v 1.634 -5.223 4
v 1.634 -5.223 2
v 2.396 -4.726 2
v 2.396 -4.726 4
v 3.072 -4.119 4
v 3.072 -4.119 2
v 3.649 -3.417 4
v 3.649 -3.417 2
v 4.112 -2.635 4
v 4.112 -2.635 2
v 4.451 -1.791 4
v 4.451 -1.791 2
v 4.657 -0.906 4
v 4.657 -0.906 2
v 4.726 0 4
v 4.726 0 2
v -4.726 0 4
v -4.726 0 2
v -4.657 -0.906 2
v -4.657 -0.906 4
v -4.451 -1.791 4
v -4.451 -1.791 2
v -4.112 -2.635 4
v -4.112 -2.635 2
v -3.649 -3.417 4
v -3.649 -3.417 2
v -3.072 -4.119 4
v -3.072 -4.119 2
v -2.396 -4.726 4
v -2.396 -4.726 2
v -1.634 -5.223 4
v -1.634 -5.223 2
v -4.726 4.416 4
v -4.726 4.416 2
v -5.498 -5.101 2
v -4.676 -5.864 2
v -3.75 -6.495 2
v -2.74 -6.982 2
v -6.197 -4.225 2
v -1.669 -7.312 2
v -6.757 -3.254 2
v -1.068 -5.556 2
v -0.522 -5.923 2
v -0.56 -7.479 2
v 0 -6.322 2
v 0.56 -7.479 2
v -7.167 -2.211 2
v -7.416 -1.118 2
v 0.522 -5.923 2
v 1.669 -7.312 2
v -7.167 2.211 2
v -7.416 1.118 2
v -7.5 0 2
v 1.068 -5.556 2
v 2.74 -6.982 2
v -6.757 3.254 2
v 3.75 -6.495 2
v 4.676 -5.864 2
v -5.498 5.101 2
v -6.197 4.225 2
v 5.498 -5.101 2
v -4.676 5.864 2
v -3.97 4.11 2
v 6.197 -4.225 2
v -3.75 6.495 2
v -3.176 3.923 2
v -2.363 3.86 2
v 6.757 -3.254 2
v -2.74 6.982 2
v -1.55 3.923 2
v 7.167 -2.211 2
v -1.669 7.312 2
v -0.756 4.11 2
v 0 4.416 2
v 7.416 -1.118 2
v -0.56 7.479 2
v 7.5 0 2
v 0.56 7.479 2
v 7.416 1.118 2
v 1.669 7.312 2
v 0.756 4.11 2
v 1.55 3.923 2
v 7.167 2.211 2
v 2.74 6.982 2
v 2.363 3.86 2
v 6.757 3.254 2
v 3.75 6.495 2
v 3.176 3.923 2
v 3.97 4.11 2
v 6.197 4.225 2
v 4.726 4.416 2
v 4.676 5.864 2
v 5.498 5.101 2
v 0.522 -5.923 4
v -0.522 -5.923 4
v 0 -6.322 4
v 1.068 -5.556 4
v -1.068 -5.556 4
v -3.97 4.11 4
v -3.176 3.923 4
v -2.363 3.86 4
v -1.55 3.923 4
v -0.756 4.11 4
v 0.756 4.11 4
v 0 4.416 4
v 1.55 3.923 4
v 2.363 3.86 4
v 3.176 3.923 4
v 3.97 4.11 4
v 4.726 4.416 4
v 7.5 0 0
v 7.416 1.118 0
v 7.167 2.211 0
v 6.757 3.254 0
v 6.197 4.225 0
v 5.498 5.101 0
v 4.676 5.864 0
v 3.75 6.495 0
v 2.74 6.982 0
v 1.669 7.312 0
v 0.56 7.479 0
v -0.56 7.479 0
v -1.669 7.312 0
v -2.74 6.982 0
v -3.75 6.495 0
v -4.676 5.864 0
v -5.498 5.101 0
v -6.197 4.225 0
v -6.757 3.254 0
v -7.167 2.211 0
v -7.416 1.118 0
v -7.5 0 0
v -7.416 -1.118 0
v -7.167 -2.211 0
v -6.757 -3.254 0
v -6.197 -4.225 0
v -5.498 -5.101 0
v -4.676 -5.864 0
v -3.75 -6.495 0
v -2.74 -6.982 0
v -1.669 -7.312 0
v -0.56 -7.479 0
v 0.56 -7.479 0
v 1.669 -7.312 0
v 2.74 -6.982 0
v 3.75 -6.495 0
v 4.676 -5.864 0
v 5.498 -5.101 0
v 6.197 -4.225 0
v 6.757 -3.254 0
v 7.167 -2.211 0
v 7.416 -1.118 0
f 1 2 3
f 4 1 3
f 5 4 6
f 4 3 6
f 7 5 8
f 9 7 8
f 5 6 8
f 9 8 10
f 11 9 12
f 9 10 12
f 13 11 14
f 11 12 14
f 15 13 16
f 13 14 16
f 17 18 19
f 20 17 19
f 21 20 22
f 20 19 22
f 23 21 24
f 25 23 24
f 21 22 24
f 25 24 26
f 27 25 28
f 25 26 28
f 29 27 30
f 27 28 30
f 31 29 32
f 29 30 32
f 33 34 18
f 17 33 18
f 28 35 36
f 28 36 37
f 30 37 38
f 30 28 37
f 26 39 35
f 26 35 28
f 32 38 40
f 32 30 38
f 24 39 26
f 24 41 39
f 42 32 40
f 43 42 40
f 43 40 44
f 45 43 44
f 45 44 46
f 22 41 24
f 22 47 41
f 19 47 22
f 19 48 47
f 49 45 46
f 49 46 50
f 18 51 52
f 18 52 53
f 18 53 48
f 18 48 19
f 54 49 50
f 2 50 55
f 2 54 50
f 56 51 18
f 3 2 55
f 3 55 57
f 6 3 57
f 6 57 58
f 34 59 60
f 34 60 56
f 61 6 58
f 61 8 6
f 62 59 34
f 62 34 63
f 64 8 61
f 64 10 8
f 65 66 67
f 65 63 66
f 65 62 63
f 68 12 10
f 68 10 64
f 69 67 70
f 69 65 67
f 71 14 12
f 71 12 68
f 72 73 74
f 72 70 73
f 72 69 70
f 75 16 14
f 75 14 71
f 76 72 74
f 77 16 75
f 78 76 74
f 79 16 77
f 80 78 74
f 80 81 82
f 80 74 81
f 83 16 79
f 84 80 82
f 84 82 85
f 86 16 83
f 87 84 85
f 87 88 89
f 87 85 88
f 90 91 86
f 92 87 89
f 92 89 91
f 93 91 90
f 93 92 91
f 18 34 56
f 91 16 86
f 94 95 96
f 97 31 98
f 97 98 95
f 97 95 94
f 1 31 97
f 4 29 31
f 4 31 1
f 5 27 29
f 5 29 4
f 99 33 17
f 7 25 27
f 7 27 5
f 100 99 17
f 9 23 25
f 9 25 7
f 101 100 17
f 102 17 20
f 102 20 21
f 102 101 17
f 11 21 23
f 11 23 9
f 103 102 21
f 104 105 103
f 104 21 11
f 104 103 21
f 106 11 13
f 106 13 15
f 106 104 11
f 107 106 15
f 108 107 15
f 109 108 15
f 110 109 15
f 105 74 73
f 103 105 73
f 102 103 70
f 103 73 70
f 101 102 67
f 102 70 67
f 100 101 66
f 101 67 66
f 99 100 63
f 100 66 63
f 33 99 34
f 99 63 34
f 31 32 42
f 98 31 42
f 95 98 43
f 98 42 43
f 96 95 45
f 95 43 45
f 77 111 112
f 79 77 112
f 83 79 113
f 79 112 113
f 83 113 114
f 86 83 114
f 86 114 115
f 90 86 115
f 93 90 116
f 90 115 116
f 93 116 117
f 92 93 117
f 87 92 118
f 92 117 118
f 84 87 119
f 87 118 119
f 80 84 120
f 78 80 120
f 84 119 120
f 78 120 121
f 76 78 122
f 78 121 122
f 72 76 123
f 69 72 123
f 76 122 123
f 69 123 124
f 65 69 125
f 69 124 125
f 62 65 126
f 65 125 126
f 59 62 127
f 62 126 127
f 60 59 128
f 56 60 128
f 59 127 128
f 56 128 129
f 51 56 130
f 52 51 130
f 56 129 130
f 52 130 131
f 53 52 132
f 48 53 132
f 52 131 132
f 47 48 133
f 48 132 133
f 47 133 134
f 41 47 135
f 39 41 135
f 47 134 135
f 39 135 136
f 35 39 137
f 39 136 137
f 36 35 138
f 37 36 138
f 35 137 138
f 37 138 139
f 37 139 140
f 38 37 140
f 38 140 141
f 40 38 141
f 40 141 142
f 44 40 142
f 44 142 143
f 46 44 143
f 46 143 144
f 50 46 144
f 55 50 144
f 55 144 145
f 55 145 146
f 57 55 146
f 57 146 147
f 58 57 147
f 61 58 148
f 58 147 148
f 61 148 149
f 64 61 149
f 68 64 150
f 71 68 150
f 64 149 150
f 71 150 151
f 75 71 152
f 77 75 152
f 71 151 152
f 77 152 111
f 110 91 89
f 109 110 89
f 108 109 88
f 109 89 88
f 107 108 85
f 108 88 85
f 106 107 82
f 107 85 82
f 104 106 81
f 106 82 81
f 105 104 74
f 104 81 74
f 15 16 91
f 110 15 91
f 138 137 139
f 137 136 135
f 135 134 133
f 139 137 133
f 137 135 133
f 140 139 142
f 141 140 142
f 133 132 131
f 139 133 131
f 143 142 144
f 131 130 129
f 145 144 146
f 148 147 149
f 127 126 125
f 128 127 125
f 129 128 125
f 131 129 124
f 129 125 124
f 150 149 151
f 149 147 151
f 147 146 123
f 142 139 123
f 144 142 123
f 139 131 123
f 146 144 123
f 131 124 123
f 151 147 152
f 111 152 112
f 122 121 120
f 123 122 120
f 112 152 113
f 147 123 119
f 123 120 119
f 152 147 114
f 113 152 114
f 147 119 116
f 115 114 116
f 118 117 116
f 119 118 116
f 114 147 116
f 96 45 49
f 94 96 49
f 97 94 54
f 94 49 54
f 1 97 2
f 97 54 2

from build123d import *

# Parameters (mm, degrees)
F0_R     = 7.5
F1_DEPTH = 2
F3_DEPTH = 2


with BuildPart() as f1:
    # F0 (on Top) → F1 (new body)
    with BuildSketch(Plane.XY):
        Circle(F0_R)
    extrude(amount=F1_DEPTH)

    # F2 (on face) → F3 (join)
    with BuildSketch(Plane.XY.offset(2)):
        with BuildLine():
            ThreePointArc((-1.634316, -5.22253), (-0.792326, -5.735097), (0, -6.321519))
            ThreePointArc((0, -6.321519), (0.792326, -5.735097), (1.634316, -5.22253))
            ThreePointArc((1.634316, -5.22253), (3.895395, -3.034618), (4.726373, 0))
            Line((4.726373, 0), (4.726373, 4.415748))
            ThreePointArc((4.726373, 4.415748), (2.363187, 3.860301), (0, 4.415748))
            ThreePointArc((0, 4.415748), (-2.363187, 3.860301), (-4.726373, 4.415748))
            Line((-4.726373, 4.415748), (-4.726373, 0))
            ThreePointArc((-4.726373, 0), (-3.895395, -3.034618), (-1.634316, -5.22253))
        make_face()
    extrude(amount=F3_DEPTH)


solid = f1.part
